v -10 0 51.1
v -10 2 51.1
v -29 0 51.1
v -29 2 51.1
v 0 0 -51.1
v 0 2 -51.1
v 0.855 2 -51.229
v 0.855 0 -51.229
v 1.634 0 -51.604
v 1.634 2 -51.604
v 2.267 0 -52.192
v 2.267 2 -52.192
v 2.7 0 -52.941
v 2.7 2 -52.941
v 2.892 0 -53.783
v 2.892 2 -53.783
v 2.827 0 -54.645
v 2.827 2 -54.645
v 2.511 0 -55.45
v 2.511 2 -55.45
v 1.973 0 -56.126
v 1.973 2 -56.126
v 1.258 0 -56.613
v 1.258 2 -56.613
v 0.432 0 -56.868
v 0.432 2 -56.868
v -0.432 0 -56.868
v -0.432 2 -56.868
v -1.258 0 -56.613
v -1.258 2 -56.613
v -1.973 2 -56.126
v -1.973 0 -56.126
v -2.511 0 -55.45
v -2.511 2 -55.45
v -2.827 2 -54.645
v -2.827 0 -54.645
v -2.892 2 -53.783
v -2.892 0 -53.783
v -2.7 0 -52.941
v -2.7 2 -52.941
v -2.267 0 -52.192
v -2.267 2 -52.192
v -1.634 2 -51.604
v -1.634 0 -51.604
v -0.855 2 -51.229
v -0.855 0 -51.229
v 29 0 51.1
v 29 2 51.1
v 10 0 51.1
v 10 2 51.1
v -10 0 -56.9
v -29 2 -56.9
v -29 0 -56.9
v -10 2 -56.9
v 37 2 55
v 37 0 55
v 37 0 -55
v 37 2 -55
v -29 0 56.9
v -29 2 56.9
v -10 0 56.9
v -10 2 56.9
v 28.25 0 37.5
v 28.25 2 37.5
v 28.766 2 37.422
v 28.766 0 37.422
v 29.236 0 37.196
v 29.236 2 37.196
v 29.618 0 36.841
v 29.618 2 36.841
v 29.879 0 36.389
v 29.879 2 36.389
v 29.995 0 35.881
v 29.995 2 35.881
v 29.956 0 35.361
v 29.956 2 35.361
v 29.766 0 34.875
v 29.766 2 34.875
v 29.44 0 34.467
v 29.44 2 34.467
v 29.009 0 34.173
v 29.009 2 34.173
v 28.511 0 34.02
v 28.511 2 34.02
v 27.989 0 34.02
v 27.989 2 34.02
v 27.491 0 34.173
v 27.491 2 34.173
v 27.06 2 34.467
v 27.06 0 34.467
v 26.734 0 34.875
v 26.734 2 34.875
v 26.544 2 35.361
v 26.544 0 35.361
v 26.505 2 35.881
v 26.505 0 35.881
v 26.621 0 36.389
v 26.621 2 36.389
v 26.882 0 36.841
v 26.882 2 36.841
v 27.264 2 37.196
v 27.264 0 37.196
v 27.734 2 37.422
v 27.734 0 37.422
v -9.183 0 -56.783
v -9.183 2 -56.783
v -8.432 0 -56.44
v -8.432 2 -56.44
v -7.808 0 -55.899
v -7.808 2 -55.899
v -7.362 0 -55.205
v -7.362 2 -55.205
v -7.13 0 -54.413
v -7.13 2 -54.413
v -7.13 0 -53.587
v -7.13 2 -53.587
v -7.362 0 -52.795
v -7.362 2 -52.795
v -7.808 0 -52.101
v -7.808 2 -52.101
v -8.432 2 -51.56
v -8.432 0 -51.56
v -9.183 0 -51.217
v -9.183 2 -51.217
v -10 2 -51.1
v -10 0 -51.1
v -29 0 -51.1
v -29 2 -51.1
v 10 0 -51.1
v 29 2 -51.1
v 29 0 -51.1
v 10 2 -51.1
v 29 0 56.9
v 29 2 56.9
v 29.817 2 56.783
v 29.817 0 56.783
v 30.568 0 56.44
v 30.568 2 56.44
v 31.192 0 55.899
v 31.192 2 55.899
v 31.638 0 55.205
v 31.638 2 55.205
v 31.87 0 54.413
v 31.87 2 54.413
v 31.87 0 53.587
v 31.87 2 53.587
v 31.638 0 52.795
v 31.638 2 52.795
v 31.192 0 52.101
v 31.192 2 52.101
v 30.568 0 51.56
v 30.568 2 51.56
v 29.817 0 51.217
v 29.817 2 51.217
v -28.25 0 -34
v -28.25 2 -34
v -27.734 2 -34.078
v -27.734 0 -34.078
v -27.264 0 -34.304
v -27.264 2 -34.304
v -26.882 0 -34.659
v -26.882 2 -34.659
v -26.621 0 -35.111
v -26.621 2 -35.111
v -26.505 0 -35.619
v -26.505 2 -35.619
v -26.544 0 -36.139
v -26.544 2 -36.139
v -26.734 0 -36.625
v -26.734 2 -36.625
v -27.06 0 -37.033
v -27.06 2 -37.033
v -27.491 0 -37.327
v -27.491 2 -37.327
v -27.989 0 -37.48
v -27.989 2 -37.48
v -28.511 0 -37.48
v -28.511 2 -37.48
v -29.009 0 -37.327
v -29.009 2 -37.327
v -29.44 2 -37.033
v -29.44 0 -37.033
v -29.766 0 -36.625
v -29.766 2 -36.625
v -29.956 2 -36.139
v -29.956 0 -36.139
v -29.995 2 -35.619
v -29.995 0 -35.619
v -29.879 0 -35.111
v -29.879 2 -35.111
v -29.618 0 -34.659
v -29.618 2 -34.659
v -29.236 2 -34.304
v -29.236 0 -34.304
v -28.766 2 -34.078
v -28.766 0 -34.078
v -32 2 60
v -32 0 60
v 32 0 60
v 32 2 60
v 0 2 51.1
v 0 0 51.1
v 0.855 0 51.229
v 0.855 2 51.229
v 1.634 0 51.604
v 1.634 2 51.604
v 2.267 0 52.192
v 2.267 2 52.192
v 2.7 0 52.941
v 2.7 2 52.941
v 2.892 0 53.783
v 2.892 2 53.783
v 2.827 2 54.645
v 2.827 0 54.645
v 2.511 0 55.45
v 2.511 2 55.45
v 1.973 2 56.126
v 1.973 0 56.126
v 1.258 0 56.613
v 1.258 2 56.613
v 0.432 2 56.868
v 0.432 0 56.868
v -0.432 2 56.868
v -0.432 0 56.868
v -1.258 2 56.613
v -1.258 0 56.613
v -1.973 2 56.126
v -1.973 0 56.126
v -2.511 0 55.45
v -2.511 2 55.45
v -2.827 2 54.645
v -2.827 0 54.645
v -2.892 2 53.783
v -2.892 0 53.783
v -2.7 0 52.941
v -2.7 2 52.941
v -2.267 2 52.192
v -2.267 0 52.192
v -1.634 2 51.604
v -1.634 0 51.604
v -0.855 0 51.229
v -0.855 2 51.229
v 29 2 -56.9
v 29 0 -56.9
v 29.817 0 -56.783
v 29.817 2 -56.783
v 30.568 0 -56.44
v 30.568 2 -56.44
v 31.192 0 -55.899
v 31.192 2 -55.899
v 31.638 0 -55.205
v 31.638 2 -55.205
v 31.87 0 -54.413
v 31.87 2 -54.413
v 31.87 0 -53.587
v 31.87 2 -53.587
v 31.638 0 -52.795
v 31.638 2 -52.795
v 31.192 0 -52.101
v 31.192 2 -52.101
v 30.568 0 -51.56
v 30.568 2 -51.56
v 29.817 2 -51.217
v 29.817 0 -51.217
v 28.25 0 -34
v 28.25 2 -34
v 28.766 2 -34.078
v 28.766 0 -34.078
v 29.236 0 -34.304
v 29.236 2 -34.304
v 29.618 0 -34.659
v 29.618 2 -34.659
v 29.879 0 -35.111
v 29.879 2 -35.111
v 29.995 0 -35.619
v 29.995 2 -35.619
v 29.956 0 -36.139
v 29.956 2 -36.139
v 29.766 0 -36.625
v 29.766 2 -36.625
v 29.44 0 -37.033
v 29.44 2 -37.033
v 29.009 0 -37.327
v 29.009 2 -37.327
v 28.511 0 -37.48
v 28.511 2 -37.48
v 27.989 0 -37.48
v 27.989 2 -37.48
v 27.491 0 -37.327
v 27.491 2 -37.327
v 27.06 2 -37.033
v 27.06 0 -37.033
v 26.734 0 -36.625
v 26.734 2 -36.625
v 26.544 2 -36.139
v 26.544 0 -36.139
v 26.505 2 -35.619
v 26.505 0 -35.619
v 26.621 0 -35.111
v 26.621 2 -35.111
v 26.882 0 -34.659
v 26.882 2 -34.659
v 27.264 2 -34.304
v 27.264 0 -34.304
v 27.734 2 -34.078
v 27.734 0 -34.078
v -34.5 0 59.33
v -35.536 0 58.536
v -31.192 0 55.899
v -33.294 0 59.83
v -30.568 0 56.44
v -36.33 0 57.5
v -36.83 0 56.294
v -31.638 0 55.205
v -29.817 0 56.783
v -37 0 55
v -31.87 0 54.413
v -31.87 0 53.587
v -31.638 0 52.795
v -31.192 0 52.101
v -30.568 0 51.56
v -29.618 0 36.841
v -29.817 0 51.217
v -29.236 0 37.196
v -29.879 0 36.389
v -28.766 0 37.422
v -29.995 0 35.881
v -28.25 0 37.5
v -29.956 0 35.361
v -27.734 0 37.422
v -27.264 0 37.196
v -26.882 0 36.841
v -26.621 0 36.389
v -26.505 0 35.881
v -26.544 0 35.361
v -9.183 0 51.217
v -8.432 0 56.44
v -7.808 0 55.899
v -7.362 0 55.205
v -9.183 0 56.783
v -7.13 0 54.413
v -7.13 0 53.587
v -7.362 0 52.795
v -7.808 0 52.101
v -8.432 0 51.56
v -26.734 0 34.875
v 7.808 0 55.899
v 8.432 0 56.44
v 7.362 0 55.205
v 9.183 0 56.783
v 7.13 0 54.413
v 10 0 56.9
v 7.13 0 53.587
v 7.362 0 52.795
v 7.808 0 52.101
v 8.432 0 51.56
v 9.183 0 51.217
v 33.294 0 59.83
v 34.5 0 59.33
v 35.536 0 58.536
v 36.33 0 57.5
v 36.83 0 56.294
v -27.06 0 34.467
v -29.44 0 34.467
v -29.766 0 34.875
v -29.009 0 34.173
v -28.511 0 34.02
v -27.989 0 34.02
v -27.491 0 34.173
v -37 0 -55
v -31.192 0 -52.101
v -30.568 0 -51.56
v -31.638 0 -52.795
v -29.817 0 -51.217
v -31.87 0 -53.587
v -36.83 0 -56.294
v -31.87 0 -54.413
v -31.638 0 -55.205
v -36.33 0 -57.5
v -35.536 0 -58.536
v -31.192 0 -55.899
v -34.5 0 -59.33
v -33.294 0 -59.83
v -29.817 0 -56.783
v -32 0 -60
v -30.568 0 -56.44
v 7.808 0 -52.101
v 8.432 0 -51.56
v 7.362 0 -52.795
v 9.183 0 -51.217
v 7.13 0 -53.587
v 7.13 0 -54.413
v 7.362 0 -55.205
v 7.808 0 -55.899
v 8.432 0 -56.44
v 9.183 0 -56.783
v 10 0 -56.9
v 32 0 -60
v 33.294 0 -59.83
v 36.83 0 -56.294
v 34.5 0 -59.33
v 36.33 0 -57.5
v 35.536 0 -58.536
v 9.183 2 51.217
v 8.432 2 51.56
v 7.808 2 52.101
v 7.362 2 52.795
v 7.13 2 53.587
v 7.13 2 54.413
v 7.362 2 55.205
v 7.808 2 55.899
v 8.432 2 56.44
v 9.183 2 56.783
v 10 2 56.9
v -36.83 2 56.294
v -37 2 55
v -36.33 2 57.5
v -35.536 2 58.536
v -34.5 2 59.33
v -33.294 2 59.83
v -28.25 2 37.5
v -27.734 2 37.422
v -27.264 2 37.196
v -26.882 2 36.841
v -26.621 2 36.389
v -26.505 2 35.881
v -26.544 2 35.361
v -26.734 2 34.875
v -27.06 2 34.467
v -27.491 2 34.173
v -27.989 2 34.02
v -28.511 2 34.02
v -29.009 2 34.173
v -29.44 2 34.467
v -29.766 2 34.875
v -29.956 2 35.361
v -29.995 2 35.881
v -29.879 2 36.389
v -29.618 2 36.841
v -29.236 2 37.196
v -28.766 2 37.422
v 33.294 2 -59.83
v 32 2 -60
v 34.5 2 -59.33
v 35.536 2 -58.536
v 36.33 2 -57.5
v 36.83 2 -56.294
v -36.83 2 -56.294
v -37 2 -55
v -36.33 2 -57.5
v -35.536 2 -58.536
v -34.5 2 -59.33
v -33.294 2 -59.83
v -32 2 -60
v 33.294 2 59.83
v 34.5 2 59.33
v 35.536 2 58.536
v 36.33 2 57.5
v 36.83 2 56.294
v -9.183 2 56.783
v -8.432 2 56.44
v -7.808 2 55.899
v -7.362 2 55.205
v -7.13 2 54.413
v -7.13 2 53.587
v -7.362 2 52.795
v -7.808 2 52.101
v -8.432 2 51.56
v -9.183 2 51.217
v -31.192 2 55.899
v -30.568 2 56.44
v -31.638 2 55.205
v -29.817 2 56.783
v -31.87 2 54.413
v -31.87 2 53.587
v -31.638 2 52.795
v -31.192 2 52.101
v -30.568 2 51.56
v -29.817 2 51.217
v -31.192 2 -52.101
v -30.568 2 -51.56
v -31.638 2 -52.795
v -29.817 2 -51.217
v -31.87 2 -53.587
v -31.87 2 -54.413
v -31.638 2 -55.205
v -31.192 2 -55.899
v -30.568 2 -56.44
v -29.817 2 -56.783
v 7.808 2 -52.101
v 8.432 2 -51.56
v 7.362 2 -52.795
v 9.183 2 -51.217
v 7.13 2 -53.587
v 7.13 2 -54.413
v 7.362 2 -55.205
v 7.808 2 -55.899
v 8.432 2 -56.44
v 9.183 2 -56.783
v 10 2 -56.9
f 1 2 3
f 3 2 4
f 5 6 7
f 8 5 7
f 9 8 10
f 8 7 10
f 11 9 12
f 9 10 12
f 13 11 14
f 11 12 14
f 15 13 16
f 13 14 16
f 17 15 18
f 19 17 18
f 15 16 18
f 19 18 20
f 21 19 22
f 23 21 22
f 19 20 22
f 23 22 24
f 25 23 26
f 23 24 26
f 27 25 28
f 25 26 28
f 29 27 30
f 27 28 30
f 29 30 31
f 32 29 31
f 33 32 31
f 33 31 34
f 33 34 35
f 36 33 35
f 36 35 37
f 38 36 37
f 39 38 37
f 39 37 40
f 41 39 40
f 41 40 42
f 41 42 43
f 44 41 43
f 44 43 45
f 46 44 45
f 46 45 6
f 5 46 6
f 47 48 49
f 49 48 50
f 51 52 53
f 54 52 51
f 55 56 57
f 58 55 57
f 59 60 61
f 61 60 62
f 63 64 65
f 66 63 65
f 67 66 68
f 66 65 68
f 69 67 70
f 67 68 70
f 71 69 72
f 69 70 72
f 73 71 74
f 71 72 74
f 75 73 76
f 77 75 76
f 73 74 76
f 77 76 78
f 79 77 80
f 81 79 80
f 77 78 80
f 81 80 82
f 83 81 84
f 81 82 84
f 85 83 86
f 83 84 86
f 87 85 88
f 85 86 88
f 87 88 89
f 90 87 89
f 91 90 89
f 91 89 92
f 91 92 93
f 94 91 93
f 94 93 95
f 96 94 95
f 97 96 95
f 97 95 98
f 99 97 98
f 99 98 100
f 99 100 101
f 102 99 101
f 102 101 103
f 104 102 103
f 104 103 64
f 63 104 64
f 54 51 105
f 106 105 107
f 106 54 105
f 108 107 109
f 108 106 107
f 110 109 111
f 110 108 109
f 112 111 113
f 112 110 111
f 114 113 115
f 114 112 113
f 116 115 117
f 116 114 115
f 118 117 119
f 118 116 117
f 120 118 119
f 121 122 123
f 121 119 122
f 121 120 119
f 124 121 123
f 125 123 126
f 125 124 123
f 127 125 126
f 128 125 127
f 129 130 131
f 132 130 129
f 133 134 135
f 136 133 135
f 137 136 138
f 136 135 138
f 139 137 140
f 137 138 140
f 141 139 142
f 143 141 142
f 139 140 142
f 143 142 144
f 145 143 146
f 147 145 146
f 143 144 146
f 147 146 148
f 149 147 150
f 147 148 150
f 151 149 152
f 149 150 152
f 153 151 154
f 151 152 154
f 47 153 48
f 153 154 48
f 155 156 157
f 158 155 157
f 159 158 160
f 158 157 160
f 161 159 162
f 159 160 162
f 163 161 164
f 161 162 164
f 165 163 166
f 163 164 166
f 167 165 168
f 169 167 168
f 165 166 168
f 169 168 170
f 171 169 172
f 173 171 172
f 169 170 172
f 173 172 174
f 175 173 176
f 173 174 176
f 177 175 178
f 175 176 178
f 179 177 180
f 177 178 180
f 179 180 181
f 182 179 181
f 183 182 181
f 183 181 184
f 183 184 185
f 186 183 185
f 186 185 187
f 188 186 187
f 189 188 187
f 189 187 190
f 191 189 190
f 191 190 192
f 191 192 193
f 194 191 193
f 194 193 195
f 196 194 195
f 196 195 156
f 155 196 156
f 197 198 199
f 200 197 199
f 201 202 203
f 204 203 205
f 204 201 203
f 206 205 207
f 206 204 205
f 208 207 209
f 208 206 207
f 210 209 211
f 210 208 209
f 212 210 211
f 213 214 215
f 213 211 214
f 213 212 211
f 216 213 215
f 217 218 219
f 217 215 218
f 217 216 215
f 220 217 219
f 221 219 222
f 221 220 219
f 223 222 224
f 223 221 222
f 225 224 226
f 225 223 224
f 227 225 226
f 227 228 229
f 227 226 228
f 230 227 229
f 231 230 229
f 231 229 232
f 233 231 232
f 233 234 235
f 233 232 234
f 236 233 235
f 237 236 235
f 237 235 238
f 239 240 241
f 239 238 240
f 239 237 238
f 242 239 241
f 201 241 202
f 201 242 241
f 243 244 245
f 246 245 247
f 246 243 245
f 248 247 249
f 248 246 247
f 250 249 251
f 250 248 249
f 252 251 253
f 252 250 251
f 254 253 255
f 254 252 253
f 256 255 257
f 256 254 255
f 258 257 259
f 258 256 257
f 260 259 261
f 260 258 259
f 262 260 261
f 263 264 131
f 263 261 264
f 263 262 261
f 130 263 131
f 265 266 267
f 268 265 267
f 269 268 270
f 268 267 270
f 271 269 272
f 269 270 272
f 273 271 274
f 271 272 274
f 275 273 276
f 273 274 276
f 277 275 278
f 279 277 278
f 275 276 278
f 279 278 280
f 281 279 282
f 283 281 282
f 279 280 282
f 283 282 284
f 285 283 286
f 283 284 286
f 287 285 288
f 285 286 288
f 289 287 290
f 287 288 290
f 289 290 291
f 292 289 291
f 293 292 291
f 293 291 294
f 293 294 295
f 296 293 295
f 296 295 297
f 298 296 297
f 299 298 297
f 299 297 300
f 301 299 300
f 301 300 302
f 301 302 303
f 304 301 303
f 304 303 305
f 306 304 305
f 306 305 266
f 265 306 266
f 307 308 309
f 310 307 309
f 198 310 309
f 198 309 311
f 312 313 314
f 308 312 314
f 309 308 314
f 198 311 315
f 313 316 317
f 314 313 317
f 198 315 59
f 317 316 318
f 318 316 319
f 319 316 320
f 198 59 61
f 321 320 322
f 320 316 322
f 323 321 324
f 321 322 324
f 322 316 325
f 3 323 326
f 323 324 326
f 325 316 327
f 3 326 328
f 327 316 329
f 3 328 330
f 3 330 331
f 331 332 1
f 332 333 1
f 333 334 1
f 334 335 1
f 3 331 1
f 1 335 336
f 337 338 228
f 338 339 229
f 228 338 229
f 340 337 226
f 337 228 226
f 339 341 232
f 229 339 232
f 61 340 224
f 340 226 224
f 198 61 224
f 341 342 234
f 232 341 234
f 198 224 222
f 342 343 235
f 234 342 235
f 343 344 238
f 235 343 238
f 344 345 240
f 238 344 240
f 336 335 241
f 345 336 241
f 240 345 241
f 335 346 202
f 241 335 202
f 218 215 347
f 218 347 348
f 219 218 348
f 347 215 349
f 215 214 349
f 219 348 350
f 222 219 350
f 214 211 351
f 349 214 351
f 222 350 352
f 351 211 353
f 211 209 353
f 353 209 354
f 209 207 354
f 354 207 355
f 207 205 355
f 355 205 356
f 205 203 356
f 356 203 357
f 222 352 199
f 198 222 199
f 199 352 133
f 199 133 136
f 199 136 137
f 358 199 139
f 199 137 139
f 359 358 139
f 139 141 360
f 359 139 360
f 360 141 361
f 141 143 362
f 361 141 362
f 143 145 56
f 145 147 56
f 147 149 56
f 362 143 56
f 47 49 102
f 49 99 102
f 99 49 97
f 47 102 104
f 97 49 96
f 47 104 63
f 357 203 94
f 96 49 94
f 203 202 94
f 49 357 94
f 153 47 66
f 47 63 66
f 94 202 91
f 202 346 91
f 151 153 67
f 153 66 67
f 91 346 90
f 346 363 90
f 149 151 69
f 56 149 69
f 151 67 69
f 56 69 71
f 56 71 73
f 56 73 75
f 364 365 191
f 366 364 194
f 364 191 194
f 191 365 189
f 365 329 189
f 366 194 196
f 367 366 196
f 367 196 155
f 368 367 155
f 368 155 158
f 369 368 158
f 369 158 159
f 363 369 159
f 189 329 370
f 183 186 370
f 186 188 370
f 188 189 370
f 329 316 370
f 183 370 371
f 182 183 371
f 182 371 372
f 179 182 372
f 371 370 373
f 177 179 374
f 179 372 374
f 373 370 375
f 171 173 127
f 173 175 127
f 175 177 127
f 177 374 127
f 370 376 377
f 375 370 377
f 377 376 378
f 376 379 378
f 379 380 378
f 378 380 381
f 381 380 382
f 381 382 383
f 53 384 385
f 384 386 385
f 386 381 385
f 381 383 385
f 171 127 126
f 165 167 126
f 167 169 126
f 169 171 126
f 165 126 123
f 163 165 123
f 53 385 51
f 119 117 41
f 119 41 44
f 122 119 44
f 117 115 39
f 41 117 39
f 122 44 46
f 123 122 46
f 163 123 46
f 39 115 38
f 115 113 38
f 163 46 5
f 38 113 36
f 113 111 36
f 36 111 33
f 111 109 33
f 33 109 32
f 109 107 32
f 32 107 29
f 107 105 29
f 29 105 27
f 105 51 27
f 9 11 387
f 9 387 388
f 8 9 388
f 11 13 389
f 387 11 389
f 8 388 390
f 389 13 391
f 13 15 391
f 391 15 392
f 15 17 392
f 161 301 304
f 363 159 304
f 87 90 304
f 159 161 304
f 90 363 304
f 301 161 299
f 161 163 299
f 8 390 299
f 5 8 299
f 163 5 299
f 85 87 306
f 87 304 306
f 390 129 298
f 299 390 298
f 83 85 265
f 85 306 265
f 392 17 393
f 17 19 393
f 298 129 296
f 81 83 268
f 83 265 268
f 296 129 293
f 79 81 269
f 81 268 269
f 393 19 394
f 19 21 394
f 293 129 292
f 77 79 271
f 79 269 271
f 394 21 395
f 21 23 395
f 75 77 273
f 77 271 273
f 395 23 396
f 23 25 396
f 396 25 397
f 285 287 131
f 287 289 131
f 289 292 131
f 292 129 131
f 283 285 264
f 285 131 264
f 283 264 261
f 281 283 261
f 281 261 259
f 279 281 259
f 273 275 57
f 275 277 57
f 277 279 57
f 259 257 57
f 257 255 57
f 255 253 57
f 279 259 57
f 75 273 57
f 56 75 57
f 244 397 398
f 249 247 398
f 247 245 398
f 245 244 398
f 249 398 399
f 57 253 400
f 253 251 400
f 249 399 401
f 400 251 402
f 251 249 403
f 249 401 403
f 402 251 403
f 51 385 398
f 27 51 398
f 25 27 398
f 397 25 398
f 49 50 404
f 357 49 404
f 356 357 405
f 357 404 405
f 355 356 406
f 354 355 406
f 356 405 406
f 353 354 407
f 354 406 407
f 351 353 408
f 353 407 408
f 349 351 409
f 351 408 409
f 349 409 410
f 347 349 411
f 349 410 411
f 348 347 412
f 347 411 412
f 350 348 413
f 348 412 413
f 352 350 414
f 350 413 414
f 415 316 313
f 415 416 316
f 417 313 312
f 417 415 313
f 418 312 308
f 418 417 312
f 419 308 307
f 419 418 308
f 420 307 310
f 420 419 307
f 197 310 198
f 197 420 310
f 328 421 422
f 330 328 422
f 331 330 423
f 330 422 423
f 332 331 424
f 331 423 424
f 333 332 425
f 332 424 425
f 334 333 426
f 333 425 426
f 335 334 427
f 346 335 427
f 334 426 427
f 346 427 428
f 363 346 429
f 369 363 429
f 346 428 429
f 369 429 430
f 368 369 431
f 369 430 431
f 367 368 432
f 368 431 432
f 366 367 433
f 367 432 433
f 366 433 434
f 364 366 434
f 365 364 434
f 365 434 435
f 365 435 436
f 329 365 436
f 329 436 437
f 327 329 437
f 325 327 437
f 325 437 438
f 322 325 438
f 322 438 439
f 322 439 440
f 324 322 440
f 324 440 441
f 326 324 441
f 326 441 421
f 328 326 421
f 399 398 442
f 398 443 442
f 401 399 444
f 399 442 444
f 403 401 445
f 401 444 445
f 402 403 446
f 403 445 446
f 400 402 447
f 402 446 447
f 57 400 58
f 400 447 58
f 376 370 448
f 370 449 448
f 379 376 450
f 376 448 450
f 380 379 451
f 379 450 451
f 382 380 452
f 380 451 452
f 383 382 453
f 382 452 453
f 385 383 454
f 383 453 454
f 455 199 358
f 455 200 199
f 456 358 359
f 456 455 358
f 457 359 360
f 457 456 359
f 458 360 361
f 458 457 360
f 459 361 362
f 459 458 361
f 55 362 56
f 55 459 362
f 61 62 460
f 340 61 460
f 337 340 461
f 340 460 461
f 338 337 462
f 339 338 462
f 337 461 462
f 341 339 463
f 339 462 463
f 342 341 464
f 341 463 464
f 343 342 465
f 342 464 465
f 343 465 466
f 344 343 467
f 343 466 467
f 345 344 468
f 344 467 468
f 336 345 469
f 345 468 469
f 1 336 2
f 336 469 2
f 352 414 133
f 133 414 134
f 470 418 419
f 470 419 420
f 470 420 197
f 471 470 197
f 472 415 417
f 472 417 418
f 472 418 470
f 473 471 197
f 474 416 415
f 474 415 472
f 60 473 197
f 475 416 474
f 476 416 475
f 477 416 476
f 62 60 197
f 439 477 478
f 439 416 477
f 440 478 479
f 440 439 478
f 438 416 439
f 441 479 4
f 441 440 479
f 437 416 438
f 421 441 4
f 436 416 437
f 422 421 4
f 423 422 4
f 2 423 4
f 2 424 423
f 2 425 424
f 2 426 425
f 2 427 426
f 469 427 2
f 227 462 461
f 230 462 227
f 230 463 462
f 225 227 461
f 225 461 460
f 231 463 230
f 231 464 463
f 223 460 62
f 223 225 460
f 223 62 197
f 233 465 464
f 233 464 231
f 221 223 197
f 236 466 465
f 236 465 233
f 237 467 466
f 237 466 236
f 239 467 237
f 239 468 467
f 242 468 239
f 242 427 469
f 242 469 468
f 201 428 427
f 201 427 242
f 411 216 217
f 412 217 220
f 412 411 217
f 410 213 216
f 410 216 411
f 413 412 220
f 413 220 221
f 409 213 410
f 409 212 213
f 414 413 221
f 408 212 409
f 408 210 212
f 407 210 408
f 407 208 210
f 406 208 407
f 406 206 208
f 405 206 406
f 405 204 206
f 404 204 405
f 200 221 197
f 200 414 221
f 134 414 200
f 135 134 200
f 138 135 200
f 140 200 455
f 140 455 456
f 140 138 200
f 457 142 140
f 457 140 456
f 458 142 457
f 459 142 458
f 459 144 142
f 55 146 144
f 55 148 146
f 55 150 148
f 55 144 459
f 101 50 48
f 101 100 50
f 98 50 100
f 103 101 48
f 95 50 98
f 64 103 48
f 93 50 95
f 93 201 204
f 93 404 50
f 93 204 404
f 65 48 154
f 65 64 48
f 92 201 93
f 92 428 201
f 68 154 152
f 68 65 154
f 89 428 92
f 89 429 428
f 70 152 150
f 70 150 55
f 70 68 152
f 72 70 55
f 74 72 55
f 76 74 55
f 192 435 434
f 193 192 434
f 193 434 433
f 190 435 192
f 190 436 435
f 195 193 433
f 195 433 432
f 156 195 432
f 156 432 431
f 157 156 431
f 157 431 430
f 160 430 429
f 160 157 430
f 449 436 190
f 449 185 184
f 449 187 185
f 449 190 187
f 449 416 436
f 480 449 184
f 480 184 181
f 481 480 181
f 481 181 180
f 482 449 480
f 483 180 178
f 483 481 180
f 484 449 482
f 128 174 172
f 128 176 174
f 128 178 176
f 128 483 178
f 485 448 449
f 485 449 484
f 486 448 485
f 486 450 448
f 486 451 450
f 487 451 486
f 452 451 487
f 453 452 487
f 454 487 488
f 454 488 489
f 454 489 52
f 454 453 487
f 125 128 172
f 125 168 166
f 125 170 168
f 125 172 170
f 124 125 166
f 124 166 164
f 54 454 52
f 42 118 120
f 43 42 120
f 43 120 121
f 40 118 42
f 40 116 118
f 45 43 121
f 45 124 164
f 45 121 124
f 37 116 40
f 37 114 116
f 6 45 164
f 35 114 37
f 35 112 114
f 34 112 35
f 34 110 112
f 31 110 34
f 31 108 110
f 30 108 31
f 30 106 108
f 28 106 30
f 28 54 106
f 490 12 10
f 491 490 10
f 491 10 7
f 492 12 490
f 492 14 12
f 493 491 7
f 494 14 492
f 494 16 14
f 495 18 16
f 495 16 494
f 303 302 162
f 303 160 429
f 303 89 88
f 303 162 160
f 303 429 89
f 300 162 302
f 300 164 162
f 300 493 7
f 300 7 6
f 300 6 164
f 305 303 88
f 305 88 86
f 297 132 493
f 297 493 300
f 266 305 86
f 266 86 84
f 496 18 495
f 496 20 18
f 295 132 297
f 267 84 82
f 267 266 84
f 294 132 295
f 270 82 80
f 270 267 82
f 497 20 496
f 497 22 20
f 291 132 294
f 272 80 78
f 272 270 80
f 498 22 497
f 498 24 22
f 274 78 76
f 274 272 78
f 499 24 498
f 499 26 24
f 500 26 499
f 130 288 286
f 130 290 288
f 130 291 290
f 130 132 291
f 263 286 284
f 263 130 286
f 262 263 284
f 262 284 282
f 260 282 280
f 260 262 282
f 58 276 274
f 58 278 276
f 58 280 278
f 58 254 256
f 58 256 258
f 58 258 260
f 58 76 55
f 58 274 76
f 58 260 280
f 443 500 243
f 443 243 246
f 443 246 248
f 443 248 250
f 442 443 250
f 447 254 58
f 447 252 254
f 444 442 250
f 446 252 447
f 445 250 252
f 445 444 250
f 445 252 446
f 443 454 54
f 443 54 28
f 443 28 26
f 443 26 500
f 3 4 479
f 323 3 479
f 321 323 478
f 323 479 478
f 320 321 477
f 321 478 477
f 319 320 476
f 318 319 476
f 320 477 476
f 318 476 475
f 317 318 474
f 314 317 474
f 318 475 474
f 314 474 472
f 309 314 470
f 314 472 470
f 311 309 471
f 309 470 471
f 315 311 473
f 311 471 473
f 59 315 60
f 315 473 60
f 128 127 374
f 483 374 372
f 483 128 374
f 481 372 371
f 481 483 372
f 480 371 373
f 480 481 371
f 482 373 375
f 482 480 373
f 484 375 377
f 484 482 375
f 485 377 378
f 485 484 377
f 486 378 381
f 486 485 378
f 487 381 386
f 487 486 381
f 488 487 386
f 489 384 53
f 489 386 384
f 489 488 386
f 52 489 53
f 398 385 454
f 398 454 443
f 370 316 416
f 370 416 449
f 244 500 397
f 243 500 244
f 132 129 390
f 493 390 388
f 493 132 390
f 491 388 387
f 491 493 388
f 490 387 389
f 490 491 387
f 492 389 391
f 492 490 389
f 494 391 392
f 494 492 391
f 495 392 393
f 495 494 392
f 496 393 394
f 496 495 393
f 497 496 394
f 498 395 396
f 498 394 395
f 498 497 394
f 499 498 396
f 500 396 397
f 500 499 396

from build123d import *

# Parameters (mm, degrees)
SKETCH1_W           = 74
SKETCH1_H           = 120
BOSS_EXTRUDE1_DEPTH = 2
SKETCH3_R           = 2.9
CUT_EXTRUDE1_DEPTH  = 71.519500849
FILLET1_R           = 5
SKETCH5_R           = 1.75
CUT_EXTRUDE2_DEPTH  = 71.519500849


with BuildPart() as part:
    # Sketch1 → Boss-Extrude1 (new body)
    with BuildSketch(Plane(origin=(0, 0, 0), x_dir=(1, 0, 0), z_dir=(0, 1, 0))):
        Rectangle(SKETCH1_W, SKETCH1_H)
    extrude(amount=BOSS_EXTRUDE1_DEPTH)

    # Sketch3 → Cut-Extrude1 (cut, through all)
    with BuildSketch(Plane(origin=(0, 2, 0), x_dir=(1, 0, 0), z_dir=(0, 1, 0))):
        with Locations(Location((0, 54, 0), (0, 0, 270))):
            Circle(SKETCH3_R)
        with BuildLine():
            Line((-29, 56.9), (-10, 56.9))
            ThreePointArc((-10, 56.9), (-7.1, 54), (-10, 51.1))
            Line((-10, 51.1), (-29, 51.1))
            ThreePointArc((-29, 51.1), (-31.9, 54), (-29, 56.9))
        make_face()
        with BuildLine():
            Line((10, 56.9), (29, 56.9))
            ThreePointArc((29, 56.9), (31.9, 54), (29, 51.1))
            Line((29, 51.1), (10, 51.1))
            ThreePointArc((10, 51.1), (7.1, 54), (10, 56.9))
        make_face()
    cut_extrude1 = extrude(amount=-CUT_EXTRUDE1_DEPTH, mode=Mode.SUBTRACT)

    # Mirror1: Cut-Extrude1 across plane
    add(cut_extrude1.mirror(Plane.XY), mode=Mode.SUBTRACT)

    # Fillet1
    fillet1_edges = [part.edges().sort_by_distance(p)[0] for p in [
        (37, 1, 60),
        (-37, 1, 60),
        (-37, 1, -60),
        (37, 1, -60),
    ]]
    fillet(fillet1_edges, radius=FILLET1_R)

    # Sketch5 → Cut-Extrude2 (cut, through all)
    with BuildSketch(Plane(origin=(0, 2, 0), x_dir=(1, 0, 0), z_dir=(0, 1, 0))):
        with Locations(Location((-28.25, 35.75, 0), (0, 0, 270))):
            Circle(SKETCH5_R)
        with Locations(Location((28.25, 35.75, 0), (0, 0, 270))):
            Circle(SKETCH5_R)
        with Locations(Location((-28.25, -35.75, 0), (0, 0, 270))):
            Circle(SKETCH5_R)
        with Locations(Location((28.25, -35.75, 0), (0, 0, 270))):
            Circle(SKETCH5_R)
    extrude(amount=-CUT_EXTRUDE2_DEPTH, mode=Mode.SUBTRACT)


solid = part.part
